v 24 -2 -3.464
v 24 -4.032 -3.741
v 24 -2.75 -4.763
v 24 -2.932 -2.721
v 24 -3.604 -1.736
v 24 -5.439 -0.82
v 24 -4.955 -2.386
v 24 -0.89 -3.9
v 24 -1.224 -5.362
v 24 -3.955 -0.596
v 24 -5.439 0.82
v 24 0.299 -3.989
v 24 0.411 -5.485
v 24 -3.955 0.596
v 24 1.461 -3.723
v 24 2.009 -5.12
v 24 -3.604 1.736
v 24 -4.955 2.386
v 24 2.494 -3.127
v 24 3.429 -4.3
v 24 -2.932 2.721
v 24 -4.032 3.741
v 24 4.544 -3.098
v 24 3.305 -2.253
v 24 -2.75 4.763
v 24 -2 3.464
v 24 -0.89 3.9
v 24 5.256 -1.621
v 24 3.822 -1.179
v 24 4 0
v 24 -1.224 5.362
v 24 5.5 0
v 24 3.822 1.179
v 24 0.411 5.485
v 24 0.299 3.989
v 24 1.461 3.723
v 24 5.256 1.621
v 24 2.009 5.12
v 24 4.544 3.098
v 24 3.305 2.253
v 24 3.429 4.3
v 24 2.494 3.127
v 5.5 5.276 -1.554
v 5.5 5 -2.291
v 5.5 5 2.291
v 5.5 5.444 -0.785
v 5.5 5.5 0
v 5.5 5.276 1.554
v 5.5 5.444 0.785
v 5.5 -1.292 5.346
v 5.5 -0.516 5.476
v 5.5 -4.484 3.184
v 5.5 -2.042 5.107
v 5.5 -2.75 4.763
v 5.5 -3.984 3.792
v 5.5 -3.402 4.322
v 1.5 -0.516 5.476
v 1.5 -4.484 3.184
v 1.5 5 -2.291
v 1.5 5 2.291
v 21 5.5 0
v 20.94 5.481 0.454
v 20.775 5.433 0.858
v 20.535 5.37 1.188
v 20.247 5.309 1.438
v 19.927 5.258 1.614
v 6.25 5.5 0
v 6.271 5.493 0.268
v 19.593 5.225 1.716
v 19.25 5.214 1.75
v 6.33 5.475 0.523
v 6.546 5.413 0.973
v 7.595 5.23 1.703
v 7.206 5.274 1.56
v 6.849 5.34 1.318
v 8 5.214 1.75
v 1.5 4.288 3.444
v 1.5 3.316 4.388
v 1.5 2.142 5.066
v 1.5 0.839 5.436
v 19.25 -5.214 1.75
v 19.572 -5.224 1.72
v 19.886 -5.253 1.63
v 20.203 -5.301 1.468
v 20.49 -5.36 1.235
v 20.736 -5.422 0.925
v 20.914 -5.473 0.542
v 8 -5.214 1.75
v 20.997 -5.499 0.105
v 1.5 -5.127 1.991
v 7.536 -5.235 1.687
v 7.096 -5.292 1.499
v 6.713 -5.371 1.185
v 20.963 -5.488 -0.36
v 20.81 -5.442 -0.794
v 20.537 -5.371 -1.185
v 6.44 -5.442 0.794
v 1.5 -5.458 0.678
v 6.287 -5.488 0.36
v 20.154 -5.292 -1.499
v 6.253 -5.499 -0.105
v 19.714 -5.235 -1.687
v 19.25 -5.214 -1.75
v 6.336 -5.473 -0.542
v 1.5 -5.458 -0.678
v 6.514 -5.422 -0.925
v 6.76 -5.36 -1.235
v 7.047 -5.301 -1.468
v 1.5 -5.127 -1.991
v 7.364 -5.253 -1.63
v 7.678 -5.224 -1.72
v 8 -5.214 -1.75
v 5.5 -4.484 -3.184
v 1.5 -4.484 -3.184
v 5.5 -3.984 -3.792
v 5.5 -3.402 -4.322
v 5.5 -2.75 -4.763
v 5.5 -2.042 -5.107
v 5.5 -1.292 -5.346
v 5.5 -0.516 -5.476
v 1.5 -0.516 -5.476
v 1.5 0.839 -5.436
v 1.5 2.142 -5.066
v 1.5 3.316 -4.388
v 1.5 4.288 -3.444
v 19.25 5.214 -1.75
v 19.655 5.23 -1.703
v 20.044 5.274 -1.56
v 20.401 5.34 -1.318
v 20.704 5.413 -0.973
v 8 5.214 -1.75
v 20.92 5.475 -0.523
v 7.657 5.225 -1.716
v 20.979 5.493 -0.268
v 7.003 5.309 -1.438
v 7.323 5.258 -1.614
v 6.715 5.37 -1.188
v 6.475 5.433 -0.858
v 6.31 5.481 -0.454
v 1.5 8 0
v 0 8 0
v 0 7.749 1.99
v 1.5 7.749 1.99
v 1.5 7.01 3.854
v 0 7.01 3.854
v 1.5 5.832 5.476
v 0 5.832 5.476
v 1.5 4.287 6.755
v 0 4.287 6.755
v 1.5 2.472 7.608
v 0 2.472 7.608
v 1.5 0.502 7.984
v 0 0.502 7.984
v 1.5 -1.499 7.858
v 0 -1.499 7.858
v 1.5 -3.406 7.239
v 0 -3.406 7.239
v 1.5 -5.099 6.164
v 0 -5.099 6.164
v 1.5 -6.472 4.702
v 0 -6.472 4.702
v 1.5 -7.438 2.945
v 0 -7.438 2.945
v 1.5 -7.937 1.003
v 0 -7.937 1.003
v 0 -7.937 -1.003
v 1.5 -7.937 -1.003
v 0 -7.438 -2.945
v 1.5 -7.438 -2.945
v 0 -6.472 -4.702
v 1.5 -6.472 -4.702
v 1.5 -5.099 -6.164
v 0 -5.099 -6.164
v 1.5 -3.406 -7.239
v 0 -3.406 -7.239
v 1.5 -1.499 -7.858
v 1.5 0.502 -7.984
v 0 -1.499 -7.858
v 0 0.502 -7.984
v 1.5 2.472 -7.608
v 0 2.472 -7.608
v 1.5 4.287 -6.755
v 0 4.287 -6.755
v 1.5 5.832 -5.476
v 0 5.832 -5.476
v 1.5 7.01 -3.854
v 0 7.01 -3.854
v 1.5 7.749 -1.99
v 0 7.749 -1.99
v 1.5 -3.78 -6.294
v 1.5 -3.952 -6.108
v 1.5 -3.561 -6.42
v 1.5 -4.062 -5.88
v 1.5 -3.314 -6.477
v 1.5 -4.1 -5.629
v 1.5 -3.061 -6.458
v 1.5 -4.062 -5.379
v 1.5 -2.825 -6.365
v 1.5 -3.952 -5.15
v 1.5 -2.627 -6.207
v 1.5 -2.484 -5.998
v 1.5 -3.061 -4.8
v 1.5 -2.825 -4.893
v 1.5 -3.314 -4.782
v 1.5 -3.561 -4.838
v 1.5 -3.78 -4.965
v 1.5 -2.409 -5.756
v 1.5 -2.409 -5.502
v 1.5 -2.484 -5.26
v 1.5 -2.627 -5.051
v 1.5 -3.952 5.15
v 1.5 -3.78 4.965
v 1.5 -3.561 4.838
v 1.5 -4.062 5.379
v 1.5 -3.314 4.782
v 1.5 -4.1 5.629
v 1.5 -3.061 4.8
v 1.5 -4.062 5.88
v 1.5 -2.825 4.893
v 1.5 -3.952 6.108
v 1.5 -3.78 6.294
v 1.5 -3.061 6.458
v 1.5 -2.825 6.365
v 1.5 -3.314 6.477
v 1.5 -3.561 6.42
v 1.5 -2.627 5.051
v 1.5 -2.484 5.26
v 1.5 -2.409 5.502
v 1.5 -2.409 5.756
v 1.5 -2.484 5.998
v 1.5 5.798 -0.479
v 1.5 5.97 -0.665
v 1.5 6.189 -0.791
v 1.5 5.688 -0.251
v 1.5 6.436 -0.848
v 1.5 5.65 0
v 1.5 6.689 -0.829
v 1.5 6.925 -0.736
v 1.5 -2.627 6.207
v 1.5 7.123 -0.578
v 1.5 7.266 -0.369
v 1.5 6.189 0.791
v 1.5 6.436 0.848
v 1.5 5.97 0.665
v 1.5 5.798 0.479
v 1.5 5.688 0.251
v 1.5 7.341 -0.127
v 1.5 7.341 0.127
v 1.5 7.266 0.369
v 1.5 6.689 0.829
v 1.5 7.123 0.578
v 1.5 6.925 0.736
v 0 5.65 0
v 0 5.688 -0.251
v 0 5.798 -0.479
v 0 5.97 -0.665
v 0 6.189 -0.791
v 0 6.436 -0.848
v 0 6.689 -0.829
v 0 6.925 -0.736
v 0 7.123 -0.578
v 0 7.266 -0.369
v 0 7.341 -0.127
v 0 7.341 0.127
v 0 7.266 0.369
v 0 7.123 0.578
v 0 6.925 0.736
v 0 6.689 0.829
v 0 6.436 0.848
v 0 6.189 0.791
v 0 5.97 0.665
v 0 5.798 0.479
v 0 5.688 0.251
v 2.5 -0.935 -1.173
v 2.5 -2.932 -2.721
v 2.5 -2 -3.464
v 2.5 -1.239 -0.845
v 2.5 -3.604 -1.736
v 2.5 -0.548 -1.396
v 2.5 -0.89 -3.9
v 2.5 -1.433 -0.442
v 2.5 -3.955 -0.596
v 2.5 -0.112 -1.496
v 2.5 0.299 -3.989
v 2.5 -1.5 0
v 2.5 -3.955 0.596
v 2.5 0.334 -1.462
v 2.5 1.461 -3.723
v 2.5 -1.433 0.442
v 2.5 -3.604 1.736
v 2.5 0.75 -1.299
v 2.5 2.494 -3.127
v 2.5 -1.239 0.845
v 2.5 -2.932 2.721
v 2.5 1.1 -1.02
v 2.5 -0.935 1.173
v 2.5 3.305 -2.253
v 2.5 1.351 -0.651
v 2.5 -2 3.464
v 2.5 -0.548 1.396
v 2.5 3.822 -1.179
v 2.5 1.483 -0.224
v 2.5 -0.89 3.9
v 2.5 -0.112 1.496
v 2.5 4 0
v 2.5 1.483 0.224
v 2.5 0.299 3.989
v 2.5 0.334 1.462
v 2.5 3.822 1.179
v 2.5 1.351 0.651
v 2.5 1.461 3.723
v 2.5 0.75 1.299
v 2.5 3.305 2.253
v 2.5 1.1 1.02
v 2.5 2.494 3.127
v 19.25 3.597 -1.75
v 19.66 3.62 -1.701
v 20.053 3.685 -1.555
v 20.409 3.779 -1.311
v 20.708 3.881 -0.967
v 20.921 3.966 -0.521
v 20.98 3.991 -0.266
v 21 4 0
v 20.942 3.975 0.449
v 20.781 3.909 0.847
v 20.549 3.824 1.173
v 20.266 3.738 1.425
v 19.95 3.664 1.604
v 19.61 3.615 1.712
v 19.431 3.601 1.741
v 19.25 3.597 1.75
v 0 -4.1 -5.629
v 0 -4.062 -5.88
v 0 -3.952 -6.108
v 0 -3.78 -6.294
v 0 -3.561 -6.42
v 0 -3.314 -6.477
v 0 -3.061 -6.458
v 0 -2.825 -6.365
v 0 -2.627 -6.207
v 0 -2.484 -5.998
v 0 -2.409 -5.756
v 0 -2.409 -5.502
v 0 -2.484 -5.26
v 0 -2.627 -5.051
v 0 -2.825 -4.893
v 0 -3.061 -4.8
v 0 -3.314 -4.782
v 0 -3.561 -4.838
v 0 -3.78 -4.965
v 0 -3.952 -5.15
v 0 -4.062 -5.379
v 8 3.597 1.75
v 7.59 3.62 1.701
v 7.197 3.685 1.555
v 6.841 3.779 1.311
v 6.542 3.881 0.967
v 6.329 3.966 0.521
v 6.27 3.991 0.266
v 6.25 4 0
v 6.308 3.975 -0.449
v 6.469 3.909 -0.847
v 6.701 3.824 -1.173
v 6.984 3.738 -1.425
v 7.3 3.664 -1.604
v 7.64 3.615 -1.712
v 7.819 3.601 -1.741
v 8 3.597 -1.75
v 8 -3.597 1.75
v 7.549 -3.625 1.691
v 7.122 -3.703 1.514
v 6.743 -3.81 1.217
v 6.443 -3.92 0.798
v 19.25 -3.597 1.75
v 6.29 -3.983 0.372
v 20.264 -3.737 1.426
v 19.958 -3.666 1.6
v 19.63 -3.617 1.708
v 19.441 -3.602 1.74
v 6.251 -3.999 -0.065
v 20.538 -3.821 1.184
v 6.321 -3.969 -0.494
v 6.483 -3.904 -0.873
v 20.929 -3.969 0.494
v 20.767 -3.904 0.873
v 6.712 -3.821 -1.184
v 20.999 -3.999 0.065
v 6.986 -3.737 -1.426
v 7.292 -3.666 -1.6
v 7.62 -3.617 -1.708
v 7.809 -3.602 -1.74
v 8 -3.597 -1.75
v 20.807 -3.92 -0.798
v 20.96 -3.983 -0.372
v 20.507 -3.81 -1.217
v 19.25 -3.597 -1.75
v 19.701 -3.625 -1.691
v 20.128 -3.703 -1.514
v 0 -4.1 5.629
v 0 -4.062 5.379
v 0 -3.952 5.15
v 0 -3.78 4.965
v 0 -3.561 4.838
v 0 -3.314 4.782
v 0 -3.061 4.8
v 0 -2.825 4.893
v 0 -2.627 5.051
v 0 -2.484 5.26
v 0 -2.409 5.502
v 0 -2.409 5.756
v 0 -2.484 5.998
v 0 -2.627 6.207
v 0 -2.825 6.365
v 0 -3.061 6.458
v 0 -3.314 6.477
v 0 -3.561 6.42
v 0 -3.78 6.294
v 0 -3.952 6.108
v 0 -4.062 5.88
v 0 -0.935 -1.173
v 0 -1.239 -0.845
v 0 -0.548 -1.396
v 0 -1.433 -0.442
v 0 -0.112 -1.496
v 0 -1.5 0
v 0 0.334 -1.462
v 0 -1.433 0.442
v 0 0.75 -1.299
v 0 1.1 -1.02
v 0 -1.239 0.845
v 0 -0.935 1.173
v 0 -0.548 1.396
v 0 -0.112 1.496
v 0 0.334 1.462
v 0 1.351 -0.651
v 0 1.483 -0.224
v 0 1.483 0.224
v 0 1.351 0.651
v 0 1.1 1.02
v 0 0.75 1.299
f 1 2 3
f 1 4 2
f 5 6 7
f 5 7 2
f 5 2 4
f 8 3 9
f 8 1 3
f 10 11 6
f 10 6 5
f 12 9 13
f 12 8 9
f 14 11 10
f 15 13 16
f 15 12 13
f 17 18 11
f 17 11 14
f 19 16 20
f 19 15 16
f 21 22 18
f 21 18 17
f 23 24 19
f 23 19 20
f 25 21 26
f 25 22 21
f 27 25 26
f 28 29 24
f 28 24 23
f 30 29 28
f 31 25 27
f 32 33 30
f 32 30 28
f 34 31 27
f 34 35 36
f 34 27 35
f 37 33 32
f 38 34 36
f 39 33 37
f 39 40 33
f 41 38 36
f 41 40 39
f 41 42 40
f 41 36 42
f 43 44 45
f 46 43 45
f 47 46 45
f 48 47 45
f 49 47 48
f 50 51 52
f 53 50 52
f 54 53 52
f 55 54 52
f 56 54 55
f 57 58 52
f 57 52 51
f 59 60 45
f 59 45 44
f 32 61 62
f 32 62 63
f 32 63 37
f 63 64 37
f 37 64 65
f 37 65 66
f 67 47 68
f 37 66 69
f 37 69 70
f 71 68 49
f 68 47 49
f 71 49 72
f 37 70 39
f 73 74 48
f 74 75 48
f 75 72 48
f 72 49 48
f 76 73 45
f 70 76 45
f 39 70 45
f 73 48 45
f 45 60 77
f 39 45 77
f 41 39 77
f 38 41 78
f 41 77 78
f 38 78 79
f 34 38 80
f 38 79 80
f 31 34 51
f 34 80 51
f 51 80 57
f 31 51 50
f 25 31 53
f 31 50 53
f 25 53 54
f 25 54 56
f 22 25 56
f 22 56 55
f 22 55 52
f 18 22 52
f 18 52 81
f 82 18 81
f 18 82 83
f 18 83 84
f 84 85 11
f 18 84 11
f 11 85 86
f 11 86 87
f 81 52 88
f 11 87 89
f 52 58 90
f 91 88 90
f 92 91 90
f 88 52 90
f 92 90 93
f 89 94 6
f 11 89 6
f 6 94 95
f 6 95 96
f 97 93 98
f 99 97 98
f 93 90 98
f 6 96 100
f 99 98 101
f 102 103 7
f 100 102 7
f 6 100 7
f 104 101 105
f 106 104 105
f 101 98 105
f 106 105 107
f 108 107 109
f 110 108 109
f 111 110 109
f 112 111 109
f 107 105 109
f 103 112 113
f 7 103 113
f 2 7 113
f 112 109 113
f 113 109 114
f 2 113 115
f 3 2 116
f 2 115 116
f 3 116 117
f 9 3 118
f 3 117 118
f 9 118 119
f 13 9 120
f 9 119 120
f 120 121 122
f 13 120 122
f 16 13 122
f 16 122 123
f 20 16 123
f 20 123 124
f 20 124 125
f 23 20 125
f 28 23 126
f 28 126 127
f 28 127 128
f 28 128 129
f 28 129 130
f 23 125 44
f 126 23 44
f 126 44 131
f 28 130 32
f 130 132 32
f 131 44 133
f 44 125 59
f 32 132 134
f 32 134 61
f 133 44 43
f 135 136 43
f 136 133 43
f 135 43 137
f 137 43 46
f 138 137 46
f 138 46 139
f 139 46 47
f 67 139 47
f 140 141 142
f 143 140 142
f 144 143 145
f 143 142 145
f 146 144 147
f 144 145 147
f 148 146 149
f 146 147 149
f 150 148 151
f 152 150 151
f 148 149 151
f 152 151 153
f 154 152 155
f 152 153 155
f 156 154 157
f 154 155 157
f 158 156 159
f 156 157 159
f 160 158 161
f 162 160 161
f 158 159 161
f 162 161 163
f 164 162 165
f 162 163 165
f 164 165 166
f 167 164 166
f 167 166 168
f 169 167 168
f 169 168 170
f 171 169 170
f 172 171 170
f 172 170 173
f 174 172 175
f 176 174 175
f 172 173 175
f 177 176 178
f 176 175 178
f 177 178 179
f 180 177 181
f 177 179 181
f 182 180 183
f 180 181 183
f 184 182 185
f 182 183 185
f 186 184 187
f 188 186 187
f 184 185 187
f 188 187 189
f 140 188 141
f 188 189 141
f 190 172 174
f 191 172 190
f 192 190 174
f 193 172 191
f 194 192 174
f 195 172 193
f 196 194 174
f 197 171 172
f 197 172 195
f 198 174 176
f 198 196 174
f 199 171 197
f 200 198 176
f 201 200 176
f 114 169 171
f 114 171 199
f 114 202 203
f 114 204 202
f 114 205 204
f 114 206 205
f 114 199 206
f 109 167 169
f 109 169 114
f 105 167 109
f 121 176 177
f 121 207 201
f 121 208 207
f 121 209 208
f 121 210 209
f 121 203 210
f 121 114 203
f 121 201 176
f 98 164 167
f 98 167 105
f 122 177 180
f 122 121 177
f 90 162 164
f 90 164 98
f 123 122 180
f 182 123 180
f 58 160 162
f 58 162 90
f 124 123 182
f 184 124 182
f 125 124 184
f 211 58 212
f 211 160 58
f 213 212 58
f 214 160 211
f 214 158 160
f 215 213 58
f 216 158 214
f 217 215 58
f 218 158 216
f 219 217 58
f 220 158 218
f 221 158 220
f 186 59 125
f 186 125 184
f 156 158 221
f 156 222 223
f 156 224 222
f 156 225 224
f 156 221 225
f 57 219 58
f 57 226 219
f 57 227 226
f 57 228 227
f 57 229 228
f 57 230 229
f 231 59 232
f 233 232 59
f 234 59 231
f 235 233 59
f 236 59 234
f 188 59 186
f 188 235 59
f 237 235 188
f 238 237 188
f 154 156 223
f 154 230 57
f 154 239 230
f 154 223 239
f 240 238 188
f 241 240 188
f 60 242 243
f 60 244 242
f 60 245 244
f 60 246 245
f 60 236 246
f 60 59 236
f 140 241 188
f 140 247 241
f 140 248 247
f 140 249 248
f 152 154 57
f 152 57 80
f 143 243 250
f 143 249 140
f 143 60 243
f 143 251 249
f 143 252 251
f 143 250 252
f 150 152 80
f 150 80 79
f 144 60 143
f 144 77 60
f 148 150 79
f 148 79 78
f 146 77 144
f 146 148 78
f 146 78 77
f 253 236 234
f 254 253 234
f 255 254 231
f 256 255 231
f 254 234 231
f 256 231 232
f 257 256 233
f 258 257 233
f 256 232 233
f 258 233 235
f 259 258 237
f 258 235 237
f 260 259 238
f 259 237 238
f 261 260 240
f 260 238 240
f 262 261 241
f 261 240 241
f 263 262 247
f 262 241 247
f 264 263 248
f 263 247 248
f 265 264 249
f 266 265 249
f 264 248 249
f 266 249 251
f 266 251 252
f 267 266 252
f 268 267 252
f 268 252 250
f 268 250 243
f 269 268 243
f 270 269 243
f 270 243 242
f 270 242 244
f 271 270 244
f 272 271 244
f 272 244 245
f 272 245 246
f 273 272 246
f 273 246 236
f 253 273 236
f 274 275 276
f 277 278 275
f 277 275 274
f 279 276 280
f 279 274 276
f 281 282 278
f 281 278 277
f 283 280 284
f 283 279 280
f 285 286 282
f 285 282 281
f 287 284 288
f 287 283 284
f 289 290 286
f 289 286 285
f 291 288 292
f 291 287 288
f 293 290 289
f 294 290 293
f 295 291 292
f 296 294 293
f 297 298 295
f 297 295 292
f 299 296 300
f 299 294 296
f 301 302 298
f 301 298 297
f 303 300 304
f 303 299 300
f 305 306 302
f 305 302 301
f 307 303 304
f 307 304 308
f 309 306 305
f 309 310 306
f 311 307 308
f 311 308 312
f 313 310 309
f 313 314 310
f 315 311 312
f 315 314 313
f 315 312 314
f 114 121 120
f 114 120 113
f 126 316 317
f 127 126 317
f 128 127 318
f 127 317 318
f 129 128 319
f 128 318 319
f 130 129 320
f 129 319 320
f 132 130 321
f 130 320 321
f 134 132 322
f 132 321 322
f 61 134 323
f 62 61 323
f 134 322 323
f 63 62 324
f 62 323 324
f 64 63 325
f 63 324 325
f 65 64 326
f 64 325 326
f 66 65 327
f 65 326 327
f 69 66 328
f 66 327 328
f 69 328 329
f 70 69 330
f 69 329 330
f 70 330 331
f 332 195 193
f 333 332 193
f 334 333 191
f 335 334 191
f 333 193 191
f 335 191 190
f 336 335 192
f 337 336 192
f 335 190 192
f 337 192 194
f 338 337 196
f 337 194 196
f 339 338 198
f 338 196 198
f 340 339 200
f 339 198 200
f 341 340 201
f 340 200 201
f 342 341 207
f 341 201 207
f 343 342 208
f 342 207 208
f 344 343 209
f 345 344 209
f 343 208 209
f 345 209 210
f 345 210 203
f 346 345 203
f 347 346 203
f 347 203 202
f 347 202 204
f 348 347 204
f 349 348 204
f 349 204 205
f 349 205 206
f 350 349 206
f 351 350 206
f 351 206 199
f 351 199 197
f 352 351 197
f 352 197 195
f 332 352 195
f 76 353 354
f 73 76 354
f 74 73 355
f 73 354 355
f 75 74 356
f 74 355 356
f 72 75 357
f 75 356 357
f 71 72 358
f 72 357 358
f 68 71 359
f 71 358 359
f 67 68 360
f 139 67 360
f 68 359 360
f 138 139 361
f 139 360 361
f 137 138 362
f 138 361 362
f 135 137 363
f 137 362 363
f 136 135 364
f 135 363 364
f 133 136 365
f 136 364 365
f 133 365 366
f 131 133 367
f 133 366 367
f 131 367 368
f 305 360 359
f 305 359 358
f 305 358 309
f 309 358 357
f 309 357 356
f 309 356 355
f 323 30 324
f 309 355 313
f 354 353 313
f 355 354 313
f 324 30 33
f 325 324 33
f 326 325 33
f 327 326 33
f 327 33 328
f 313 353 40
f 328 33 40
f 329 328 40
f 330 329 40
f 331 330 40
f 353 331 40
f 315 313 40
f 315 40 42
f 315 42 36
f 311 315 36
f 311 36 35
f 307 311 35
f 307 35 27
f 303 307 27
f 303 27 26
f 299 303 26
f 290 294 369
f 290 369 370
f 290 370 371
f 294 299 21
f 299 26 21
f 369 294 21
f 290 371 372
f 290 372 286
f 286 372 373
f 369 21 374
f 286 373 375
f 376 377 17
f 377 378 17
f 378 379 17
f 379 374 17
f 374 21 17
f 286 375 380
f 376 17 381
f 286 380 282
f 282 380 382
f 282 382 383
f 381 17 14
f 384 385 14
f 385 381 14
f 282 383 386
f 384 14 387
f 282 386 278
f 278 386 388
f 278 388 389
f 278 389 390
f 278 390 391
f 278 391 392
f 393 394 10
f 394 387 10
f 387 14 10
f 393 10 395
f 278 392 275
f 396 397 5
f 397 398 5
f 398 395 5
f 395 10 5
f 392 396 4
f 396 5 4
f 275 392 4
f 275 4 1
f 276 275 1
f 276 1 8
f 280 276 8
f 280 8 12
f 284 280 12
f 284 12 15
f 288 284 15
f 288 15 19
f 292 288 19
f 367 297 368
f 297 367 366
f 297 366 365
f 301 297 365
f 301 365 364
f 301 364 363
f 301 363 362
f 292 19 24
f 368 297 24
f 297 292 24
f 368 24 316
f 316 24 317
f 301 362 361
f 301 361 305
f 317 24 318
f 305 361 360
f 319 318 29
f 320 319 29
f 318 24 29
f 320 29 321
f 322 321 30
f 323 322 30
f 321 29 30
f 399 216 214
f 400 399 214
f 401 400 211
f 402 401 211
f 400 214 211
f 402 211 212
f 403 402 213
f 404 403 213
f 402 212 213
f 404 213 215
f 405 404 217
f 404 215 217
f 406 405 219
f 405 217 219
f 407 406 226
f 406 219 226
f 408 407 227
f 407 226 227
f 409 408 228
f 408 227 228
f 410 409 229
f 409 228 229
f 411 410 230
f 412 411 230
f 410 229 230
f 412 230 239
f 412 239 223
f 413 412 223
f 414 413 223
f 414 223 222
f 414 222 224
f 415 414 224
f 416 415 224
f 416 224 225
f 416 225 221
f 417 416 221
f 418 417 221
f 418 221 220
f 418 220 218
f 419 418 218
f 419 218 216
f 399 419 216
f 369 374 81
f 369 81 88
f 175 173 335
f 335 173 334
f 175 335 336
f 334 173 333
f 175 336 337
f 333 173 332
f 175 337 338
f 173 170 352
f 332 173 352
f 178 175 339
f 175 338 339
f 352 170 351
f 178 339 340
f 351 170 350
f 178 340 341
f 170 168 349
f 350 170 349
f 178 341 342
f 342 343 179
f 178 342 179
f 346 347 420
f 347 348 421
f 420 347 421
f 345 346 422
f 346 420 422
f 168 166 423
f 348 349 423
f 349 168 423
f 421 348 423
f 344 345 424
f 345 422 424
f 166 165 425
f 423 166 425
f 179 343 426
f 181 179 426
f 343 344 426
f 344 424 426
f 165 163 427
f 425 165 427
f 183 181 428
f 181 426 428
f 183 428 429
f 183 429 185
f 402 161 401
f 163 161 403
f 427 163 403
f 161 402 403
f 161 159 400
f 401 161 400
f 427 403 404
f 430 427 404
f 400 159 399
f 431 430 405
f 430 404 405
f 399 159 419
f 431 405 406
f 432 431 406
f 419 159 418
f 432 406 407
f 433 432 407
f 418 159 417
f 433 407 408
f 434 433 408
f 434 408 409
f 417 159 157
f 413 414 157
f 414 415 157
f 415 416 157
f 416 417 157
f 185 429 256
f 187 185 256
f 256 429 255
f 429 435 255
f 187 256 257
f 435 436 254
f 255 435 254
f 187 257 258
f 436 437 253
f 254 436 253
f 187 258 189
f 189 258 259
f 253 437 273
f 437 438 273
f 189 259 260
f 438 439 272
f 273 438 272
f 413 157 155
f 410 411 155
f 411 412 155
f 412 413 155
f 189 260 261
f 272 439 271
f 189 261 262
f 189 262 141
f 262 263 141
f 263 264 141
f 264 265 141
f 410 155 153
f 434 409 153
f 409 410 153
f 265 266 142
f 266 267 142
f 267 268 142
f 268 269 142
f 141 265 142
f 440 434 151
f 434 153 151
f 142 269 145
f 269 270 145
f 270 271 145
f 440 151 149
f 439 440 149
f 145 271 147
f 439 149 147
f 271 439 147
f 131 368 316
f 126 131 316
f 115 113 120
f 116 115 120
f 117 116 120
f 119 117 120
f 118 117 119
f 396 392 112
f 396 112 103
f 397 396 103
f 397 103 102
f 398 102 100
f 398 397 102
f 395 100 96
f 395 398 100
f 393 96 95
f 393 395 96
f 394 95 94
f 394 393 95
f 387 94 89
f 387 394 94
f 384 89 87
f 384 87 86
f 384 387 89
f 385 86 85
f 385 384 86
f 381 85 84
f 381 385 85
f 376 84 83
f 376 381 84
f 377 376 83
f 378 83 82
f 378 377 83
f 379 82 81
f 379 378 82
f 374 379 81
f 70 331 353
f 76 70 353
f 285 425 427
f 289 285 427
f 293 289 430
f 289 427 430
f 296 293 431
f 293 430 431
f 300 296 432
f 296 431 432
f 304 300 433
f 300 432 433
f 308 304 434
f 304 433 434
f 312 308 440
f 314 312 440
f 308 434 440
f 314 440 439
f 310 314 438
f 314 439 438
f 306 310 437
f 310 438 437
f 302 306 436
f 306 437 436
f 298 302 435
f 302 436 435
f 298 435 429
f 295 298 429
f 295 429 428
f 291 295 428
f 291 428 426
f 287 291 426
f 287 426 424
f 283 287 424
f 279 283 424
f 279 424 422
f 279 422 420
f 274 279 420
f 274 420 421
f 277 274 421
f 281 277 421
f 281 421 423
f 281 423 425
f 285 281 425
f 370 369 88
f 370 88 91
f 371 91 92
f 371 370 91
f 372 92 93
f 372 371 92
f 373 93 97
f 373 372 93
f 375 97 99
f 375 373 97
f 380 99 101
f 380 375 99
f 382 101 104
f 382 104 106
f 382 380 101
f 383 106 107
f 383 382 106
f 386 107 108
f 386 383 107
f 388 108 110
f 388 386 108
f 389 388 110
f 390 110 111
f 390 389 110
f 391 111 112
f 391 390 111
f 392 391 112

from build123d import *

# Parameters (mm, degrees)
F0_R             = 8
F1_DEPTH         = 1.5
F2_R             = 5.5
F3_DEPTH         = 22.5
F4_R             = 4
F5_DEPTH         = 21.5
F7_D             = 1.7
F9_D             = 3
F11_DEPTH        = 8.001
F11_DEPTH_BACK   = 25
F13_DEPTH        = 4
F13_COPIES_COUNT = 3


# Not quite as in the source:
# - a pattern or mirror of a feature is missing from the dataset's text; its kind, count and spacing are read off the source's solid


with BuildPart() as f1:
    # F0 (on Right) → F1 (new body)
    with BuildSketch(Plane.YZ):
        Circle(F0_R)
    extrude(amount=F1_DEPTH)

    # F2 (on face) → F3 (join)
    with BuildSketch(Plane.YZ.offset(1.5)):
        Circle(F2_R)
    extrude(amount=F3_DEPTH)

    # F4 (on face) → F5 (cut)
    with BuildSketch(Plane.YZ.offset(24)):
        Circle(F4_R)
    extrude(amount=-F5_DEPTH, mode=Mode.SUBTRACT)

    # F7 (through all)
    with Locations(Plane(origin=(0, 0, 0), x_dir=(0, 1, 0), z_dir=(-1, 0, 0))):
        with Locations((-3.25, -5.6291651246), (6.5, 0), (-3.25, 5.6291651246)):
            Hole(F7_D / 2)

    # F9 (through all)
    with Locations(Plane.YZ.offset(2.5)):
        with Locations((0, 0)):
            Hole(F9_D / 2)

    # F10 (on Front) → F11 (cut, two sides)
    with BuildSketch(Plane.XZ) as f11_sk:
        with BuildLine():
            Line((8, -1.75), (19.25, -1.75))
            ThreePointArc((19.25, -1.75), (21, 0), (19.25, 1.75))
            Line((19.25, 1.75), (8, 1.75))
            ThreePointArc((8, 1.75), (6.25, 0), (8, -1.75))
        make_face()
    extrude(amount=-F11_DEPTH, mode=Mode.SUBTRACT)
    extrude(f11_sk.sketch, amount=F11_DEPTH_BACK, mode=Mode.SUBTRACT)

    # F12 (on face) → F13 (cut)
    with BuildSketch(Plane.YZ.offset(1.5)):
        with BuildLine():
            Line((-0.5156865167, -5.4757709427), (-4.4843134833, -3.1844830952))
            ThreePointArc((-4.4843134833, -3.1844830952), (-3.702278018, -4.0673255927), (-2.7500001403, -4.7631396398))
            ThreePointArc((-2.7500001403, -4.7631396398), (-1.6712684341, -5.2399295626), (-0.5156865167, -5.4757709427))
        make_face()
    f13 = extrude(amount=F13_DEPTH, mode=Mode.SUBTRACT)

    # F13_copies: F13 ×3 about axis
    f13_copies_axis = Axis((0, 0, 0), (1, 0, 0))
    for i in range(1, F13_COPIES_COUNT):
        add(f13.rotate(f13_copies_axis, i * 360 / F13_COPIES_COUNT), mode=Mode.SUBTRACT)


solid = f1.part
